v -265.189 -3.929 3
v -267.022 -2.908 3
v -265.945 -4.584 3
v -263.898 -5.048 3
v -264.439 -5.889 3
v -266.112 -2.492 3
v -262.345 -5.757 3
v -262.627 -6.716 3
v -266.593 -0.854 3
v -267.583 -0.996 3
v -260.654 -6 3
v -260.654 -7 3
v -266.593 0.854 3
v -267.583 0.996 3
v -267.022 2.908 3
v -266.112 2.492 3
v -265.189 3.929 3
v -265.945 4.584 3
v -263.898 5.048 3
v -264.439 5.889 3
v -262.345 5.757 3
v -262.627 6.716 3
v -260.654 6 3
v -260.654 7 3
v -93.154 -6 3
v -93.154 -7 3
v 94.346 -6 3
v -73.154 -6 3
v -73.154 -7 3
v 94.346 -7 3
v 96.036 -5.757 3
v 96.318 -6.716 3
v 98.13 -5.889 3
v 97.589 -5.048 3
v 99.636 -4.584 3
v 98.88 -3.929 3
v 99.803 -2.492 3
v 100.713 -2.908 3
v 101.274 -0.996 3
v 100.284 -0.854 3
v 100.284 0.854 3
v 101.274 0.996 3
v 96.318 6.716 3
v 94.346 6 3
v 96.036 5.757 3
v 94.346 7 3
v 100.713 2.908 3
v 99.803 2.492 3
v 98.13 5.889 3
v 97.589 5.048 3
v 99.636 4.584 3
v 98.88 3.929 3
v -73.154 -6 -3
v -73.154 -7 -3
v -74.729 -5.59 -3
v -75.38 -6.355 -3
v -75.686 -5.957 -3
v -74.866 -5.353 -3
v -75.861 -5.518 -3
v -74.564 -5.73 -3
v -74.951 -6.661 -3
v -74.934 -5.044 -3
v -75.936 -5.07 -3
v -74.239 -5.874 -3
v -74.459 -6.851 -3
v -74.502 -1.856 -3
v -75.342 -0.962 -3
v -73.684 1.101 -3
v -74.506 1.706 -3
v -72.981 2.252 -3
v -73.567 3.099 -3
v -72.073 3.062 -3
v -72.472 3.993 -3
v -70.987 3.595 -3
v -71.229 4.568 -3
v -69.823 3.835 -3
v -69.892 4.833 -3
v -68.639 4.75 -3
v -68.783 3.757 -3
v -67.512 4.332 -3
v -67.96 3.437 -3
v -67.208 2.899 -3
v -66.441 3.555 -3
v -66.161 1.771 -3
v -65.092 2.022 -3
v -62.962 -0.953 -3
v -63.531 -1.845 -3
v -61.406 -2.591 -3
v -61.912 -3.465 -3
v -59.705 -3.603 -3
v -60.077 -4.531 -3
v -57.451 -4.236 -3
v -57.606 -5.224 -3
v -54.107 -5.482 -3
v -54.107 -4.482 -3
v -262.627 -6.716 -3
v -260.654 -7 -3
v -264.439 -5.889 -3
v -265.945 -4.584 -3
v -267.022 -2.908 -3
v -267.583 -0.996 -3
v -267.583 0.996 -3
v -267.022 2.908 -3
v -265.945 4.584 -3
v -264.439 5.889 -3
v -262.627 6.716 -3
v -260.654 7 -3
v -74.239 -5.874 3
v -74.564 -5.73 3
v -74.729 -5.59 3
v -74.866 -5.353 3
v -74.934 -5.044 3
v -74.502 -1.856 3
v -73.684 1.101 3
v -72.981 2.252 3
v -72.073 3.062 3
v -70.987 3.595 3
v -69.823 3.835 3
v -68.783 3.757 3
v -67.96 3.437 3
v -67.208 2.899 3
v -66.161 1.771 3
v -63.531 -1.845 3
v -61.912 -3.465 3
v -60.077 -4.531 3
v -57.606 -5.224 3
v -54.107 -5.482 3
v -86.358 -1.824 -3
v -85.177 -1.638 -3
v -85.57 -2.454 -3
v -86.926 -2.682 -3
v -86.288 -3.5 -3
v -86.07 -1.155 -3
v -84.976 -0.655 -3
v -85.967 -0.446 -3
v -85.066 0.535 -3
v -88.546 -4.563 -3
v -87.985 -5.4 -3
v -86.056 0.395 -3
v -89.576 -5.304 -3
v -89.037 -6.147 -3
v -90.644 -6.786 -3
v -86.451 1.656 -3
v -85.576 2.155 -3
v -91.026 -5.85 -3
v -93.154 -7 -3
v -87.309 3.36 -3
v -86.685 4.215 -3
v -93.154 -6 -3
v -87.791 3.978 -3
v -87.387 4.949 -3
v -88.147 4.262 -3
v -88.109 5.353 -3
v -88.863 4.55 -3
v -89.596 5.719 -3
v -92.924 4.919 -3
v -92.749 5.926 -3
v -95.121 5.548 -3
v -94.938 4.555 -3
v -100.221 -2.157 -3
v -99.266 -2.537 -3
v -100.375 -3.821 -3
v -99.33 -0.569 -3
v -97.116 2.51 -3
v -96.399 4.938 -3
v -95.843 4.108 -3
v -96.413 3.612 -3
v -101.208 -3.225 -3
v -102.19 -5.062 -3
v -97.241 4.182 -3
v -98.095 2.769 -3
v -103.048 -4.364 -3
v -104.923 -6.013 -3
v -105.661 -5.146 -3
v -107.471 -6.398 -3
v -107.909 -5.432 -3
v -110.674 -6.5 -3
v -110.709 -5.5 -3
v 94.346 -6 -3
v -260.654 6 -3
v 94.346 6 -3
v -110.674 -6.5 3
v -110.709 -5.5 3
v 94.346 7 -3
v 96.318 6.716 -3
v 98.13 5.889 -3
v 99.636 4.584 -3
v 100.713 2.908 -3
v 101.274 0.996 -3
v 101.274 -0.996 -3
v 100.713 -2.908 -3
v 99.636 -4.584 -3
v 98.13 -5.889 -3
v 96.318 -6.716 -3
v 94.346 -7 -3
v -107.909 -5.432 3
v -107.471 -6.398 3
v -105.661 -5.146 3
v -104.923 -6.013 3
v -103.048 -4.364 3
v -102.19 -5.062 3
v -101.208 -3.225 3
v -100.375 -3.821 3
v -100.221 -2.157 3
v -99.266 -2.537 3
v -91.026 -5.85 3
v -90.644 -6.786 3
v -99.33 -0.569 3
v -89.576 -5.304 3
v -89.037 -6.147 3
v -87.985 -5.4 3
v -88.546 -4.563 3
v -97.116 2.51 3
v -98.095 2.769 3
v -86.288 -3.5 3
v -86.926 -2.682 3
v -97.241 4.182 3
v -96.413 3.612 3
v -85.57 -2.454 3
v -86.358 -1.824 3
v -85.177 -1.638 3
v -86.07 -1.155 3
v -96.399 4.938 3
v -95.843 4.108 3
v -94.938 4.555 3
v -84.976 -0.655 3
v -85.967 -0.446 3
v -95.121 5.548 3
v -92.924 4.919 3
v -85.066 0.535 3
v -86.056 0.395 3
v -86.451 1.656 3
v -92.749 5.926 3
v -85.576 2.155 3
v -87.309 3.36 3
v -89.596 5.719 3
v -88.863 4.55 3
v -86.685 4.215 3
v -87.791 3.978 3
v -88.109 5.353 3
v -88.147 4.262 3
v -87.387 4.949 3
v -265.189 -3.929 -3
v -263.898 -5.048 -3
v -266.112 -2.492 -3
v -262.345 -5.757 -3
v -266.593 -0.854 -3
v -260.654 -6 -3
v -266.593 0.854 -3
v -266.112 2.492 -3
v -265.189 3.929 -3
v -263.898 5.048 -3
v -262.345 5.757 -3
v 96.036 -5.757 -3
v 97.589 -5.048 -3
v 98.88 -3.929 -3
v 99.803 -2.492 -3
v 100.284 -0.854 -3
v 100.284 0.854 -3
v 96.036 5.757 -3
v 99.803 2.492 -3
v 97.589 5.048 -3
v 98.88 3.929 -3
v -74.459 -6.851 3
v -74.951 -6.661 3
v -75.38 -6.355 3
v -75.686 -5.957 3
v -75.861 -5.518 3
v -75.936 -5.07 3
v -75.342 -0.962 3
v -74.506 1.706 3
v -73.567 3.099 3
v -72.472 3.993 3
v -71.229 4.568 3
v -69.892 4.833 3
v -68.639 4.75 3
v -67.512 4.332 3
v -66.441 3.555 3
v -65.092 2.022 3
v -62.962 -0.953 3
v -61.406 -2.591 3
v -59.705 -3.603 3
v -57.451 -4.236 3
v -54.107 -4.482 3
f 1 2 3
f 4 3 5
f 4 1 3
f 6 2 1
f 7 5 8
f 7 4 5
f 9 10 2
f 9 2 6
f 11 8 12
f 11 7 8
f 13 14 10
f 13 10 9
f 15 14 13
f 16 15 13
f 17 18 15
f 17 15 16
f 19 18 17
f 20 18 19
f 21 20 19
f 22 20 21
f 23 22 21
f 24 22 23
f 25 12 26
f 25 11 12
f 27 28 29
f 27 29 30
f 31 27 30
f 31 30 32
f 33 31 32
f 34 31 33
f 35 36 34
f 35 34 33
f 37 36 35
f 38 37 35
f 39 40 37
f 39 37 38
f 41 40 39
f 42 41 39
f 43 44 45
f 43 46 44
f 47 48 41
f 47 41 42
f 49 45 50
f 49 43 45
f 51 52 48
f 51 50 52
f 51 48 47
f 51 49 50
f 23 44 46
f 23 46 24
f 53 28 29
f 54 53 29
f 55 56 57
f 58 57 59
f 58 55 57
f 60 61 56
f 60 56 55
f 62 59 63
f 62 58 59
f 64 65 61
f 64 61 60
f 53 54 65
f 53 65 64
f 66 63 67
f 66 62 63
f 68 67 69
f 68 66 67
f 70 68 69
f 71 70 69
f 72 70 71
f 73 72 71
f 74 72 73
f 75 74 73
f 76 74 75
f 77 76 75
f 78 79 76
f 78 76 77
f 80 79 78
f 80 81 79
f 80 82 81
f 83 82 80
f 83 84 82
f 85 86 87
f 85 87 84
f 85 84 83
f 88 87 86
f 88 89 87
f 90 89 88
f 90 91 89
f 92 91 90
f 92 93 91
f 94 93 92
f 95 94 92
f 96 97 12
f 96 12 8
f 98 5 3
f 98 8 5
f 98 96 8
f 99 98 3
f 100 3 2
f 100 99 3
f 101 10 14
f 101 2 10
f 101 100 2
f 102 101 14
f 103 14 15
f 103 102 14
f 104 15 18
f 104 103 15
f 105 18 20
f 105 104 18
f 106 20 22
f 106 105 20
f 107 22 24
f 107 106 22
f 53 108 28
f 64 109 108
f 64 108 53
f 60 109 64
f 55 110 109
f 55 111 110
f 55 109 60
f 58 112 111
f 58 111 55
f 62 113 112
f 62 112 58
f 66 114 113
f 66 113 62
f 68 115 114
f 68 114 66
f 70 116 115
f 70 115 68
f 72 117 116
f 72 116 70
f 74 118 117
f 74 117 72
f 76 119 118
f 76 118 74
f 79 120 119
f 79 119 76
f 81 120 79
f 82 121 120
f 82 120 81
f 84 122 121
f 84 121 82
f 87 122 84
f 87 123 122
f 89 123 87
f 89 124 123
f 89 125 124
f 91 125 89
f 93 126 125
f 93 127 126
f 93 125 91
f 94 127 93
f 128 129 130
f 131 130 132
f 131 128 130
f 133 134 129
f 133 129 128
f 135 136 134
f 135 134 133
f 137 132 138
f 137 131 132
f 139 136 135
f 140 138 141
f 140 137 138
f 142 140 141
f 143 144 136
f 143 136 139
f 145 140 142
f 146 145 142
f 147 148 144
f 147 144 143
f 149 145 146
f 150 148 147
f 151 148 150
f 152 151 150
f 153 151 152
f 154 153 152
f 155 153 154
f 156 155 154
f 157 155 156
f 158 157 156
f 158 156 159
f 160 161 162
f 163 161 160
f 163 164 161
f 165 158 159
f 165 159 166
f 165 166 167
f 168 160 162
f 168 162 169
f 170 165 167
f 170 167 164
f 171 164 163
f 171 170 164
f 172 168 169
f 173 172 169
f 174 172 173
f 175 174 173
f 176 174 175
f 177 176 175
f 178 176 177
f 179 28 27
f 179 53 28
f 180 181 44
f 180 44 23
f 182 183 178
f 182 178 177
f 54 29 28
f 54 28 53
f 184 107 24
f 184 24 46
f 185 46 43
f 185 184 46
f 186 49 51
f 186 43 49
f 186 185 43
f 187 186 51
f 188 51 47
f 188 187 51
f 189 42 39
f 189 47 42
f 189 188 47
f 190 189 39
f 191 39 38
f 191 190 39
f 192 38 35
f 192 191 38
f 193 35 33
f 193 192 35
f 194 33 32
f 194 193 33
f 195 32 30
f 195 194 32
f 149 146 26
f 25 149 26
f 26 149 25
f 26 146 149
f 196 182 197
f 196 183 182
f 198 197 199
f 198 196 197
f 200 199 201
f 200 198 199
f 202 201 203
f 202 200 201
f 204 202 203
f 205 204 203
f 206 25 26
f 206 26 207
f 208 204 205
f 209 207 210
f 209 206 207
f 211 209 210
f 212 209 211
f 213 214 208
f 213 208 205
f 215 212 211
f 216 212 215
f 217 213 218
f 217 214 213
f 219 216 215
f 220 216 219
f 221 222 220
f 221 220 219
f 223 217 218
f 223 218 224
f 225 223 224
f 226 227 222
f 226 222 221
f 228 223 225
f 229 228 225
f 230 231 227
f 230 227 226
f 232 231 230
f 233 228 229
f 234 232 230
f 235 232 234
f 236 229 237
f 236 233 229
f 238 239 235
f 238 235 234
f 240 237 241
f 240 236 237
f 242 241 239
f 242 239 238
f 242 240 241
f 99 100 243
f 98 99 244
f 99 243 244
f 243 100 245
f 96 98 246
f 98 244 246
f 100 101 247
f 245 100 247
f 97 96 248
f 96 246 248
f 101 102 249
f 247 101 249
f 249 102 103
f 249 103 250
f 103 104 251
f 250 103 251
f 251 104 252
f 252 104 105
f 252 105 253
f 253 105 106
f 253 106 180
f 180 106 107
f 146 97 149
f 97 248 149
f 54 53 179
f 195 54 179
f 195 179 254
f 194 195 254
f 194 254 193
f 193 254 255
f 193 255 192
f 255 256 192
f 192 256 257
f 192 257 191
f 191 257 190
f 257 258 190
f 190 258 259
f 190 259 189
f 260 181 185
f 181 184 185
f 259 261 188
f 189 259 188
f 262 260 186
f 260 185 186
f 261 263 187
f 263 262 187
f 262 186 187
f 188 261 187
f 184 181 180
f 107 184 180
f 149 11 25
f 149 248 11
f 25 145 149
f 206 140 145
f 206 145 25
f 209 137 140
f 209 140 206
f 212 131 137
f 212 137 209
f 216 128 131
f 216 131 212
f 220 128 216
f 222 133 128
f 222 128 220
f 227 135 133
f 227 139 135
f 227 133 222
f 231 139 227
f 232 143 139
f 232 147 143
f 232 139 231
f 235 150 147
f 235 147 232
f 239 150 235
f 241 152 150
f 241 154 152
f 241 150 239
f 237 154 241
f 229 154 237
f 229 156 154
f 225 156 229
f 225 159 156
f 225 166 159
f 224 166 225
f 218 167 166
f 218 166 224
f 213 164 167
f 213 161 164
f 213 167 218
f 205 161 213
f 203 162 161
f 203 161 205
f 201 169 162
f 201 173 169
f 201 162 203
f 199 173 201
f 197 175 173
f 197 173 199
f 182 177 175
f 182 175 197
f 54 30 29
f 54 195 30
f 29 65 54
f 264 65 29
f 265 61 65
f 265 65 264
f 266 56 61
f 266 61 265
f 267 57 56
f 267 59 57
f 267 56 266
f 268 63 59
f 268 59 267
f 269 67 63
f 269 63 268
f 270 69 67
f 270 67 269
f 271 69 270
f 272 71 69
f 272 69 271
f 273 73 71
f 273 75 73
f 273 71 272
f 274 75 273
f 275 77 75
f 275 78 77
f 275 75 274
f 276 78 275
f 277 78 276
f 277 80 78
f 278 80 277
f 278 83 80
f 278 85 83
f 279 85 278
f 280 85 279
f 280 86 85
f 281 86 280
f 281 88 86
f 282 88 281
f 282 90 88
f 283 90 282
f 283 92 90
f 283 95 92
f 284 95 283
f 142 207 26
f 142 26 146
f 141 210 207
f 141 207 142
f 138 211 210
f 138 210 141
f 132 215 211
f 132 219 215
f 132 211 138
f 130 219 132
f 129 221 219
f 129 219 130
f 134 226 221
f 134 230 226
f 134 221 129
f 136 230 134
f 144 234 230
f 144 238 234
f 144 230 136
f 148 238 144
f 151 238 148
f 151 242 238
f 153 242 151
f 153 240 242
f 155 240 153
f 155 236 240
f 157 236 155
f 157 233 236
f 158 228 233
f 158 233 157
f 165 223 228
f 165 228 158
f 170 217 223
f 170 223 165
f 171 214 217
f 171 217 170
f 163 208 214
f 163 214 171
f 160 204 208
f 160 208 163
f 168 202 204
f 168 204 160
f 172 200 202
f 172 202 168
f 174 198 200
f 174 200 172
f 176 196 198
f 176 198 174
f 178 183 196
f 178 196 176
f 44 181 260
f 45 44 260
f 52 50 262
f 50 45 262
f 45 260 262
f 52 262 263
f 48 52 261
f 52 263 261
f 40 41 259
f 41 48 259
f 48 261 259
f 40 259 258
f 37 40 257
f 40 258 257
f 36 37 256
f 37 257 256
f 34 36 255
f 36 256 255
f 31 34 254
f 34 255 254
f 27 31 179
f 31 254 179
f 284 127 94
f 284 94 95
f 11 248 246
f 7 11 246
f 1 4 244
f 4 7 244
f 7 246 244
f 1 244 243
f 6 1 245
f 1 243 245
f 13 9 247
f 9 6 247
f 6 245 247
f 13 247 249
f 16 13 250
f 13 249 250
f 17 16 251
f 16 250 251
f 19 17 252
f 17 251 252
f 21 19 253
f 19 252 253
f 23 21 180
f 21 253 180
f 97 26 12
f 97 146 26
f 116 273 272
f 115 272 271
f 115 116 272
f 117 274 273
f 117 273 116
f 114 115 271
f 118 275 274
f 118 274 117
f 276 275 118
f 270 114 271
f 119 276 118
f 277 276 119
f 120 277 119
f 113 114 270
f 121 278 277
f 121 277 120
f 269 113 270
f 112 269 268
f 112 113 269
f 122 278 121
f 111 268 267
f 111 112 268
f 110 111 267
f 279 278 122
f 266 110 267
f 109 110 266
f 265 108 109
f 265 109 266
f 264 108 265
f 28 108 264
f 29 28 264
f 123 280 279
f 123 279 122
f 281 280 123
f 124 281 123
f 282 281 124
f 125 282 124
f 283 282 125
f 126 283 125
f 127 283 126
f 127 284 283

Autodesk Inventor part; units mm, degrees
ref_plane "YZ Plane" through (0, 0, 0) normal (1, 0, 0) x (0, 1, 0)
ref_plane "XZ Plane" through (0, 0, 0) normal (0, 1, 0) x (-1, 0, 0)
ref_plane "XY Plane" through (0, 0, 0) normal (0, 0, 1) x (1, 0, 0)
sketch "Sketch1" plane through (0, 0, 0) normal (0, 0, 1) x (1, 0, 0)
  line L0 (-260.6545, 0) -> (94.3455, 0) construction
  line L1 (-260.6545, -6) -> (94.3455, -6)
  line L2 (94.3455, 6) -> (-260.6545, 6)
  arc A0 (-260.6545, 6) -> (-260.6545, -6) centre (-260.6545, 0) ccw
  arc A1 (94.3455, -6) -> (94.3455, 6) centre (94.3455, 0) ccw
  line L3 (-260.6545, 7) -> (94.3455, 7)
  arc A2 (94.3455, -7) -> (94.3455, 7) centre (94.3455, 0) ccw
  line L4 (94.3455, -7) -> (-260.6545, -7)
  arc A3 (-260.6545, 7) -> (-260.6545, -7) centre (-260.6545, 0) ccw
  point P0 (0, 0)
  point P1 (-83.1545, 0)
  dimension "d0" = 355
  dimension "d1" = 12
  dimension "d2" = 1
extrude "Extrusion1" add sketch "Sketch1" along normal mid plane 6
sketch "Sketch2" plane through (-260.6545, -7, -3) normal (0, -1, 0) x (1, 0, 0)
  line L0 (206.0244, 13.746) -> (201.5244, 13.746) projected
  line L1 (0, 6) -> (355, 6) projected
  line L2 (355, 0) -> (0, 0) projected
  line L3 (167.5, 6) -> (187.5, 6)
  line L4 (187.5, 6) -> (187.5, 0)
  line L5 (187.5, 0) -> (167.5, 0)
  line L6 (167.5, 0) -> (167.5, 6)
  point P0 (177.5, 6)
  point P1 (177.5, 6)
  point P2 (167.5, 6)
  point P3 (167.5, 0)
  point P4 (187.5, 0)
  dimension "d11" = 20
extrude "Extrusion2" cut sketch "Sketch2" against normal blind 6.75
sketch "Sketch8" plane through (-93.1545, -7, 3) normal (1, 0, 0) x (0, 0, -1)
  line L0 (0, 1) -> (6, 1) projected
  line L1 (0, 0) -> (0, 1) projected
  line L2 (6, 0) -> (0, 0) projected
  line L3 (6, 1) -> (6, 0) projected
  point P0 (3, 7)
sketch "Sketch7" plane through (0, 0, 0) normal (0, 0, 1) x (1, 0, 0)
  line L0 (-93.1545, -6) -> (-93.1545, -7) projected
  line L1 (-93.1545, -6.5) -> (-89.0673, -6.7129) construction
  line L2 (-89.0673, -6.7129) -> (-86.7525, -2.7076) construction
  line L3 (-86.7525, -2.7076) -> (-83.9714, -1.5591) construction
  line L4 (-83.9714, -1.5591) -> (-87.6548, 5.441) construction
  line L5 (-87.6548, 5.441) -> (-88.2408, 4.8378) construction
  line L6 (-88.2408, 4.8378) -> (-101.2646, 7.0254) construction
  line L7 (-101.2646, 7.0254) -> (-96.9569, -6.2416) construction
  line L8 (-260.6545, -6) -> (-93.1545, -6) projected
  line L9 (-96.9569, -6.2416) -> (-110.6916, -6) construction
  spline S0 degree 4 poles (-93.1545, -6.5) (-89.0673, -6.7129) (-86.7525, -2.7076) (-83.9714, -1.5591) (-87.6548, 5.441) (-88.2408, 4.8378) (-101.2646, 7.0254) (-96.9569, -6.2416) (-110.6916, -6) knots 1 1 1 1 1 2 3 4 5 6 6 6 6 6
  point P0 (0, 0)
sweep "Sweep3" add profiles "Sketch8" path "Sketch7" separate body path curves S0
sketch "Sketch9" plane through (0, 0, 0) normal (0, 0, 1) x (1, 0, 0)
  line L0 (-73.1545, -6) -> (-73.1545, -7) projected
  line L1 (-73.1545, -6.5) -> (-76.1323, -6.5) construction
  line L2 (-76.1323, -6.5) -> (-74.9986, -3.4039) construction
  line L3 (-74.9986, -3.4039) -> (-74.9986, 2.2319) construction
  line L4 (-74.9986, 2.2319) -> (-70.9519, 4.7064) construction
  line L5 (-70.9519, 4.7064) -> (-66.3126, 4.7064) construction
  line L6 (-66.3126, 4.7064) -> (-63.6682, -1.8252) construction
  line L7 (-63.6682, -1.8252) -> (-60.0675, -4.9825) construction
  line L8 (-60.0675, -4.9825) -> (-54.1072, -4.9825) construction
  spline S0 degree 4 poles (-73.1545, -6.5) (-76.1323, -6.5) (-74.9986, -3.4039) (-74.9986, 2.2319) (-70.9519, 4.7064) (-66.3126, 4.7064) (-63.6682, -1.8252) (-60.0675, -4.9825) (-54.1072, -4.9825) knots 1 1 1 1 1 2 3 4 5 6 6 6 6 6
  point P0 (0, 0)
sketch "Sketch10" plane through (-73.1545, -7, -3) normal (-1, 0, 0) x (0, 0, 1)
  line L0 (0, 1) -> (6, 1) projected
  line L1 (0, 0) -> (0, 1) projected
  line L2 (6, 0) -> (0, 0) projected
  line L3 (6, 1) -> (6, 0) projected
  point P0 (3, 7)
sweep "Sweep4" add profiles "Sketch10" path "Sketch9" separate body path curves S0
properties part number "0005-10-1015 curea x"
